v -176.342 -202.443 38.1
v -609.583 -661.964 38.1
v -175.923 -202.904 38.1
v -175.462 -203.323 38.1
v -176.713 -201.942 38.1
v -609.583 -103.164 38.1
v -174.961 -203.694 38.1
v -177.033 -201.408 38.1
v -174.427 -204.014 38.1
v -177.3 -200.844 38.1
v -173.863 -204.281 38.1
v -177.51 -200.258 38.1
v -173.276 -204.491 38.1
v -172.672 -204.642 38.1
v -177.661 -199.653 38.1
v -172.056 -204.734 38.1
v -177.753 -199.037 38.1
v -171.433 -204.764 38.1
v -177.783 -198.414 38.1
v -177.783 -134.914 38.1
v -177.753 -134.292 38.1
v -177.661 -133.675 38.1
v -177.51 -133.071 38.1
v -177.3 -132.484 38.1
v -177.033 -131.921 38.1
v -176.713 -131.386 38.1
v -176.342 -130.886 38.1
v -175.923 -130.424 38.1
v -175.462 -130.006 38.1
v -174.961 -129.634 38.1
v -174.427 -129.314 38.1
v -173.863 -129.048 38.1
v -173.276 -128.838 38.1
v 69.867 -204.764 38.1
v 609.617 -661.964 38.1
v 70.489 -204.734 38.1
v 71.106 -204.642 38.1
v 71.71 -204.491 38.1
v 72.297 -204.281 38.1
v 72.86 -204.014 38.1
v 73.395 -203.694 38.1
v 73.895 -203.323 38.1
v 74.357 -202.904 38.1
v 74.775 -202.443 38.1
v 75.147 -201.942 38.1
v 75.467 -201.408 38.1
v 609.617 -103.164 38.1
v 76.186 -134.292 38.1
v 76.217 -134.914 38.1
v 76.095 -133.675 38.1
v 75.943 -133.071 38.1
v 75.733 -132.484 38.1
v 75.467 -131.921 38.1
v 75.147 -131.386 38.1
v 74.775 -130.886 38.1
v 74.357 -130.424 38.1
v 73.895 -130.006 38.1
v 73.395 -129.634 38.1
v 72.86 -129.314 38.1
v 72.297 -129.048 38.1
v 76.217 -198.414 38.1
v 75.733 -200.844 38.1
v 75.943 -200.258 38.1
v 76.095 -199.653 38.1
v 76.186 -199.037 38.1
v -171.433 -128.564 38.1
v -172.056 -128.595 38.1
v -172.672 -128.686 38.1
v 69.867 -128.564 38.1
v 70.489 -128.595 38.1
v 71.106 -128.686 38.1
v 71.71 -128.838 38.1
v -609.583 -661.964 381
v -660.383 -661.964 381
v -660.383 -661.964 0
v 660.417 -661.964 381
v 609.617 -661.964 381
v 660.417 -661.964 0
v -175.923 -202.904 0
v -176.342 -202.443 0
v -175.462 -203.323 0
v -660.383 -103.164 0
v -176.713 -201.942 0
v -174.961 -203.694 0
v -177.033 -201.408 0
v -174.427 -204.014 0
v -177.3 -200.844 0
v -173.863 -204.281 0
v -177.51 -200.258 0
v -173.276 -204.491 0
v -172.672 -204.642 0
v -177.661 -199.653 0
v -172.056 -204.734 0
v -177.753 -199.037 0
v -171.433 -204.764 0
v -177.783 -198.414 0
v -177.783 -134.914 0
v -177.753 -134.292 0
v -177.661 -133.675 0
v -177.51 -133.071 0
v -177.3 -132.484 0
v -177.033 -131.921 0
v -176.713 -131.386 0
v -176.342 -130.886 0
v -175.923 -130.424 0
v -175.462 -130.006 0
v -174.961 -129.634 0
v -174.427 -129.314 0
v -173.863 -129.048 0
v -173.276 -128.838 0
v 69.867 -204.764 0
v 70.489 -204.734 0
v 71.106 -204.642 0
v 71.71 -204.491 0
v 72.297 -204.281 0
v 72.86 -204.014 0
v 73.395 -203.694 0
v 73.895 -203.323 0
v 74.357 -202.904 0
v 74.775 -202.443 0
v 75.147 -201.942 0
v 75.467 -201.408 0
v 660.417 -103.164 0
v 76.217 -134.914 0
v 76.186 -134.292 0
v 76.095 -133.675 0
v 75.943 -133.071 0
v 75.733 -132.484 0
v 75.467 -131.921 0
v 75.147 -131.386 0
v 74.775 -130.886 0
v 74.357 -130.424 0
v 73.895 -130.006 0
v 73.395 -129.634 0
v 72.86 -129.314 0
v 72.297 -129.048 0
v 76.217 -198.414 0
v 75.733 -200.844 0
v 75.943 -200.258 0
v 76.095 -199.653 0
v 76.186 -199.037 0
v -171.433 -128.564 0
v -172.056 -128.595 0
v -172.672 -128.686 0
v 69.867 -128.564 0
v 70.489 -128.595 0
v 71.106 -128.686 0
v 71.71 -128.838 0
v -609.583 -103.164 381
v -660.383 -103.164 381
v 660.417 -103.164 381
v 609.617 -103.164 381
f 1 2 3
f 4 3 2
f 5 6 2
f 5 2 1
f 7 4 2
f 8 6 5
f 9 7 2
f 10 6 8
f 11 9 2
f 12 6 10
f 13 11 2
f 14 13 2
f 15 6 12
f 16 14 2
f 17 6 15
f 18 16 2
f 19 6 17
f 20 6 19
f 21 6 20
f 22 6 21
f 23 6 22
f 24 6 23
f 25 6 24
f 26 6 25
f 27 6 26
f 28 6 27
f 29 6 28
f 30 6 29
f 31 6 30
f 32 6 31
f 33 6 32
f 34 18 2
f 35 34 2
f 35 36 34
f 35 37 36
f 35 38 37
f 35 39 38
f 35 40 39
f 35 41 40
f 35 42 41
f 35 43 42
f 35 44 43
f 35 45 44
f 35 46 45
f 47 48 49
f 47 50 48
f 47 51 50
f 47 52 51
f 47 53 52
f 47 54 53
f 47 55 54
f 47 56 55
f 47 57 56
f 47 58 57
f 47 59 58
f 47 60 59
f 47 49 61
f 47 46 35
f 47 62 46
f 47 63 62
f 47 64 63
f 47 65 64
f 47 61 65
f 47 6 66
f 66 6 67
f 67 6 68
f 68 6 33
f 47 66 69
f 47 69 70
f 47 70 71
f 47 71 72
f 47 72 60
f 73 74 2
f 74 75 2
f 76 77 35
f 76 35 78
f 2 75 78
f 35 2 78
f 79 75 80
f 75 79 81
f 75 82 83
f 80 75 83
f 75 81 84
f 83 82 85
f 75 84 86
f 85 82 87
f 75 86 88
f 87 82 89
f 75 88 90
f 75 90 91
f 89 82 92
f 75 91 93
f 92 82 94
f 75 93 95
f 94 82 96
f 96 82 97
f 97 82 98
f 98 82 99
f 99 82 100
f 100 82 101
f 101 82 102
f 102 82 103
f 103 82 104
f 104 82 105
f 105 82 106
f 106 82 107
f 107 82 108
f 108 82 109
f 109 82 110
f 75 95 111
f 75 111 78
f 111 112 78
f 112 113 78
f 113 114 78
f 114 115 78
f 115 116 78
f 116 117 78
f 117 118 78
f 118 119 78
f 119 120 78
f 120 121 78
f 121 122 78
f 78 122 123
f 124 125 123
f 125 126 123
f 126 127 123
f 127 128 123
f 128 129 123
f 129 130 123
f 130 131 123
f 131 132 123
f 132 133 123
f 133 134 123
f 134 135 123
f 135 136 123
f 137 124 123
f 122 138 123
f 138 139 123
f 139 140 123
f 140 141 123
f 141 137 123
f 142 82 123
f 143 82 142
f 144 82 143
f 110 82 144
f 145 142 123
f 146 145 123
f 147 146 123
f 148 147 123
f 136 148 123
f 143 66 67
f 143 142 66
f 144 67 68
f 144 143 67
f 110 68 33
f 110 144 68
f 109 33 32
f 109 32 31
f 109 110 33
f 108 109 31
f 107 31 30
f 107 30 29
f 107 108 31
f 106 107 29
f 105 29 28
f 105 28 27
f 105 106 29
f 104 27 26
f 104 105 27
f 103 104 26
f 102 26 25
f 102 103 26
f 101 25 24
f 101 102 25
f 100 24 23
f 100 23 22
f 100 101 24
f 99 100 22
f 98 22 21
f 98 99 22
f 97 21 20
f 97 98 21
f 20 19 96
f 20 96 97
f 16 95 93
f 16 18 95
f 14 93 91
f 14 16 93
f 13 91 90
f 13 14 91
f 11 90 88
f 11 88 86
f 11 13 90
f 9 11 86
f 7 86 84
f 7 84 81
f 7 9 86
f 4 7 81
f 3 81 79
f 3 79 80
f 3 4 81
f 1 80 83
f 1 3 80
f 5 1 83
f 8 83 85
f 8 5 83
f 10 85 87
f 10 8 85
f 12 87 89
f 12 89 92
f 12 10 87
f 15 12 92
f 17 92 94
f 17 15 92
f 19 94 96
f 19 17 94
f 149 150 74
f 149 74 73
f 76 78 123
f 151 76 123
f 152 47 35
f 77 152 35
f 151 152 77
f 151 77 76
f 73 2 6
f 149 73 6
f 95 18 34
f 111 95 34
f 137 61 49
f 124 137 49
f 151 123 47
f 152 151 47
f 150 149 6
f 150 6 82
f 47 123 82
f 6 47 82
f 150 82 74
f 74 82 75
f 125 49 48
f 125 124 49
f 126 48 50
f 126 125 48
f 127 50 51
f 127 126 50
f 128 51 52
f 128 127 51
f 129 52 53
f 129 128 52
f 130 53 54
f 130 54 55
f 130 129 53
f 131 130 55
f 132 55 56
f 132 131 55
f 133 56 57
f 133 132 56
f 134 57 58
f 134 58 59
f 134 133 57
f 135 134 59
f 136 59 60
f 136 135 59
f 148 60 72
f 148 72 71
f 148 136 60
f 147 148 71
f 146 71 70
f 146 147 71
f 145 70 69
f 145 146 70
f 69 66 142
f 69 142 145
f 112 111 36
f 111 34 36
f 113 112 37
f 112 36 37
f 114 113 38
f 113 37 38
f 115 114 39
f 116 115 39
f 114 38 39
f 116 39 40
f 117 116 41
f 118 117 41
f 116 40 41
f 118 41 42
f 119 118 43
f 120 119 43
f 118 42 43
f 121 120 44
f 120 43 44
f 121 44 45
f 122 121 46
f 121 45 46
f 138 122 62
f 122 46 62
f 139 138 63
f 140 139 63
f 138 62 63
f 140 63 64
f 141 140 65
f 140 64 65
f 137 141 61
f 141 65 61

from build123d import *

# Parameters (mm, degrees)
F0_W     = 1320.8
F0_H     = 558.8
F1_DEPTH = 38.1
F2_W     = 254
F2_H     = 76.2
F3_DEPTH = 333.248
F4_R     = 6.35
F5_DEPTH = 342.9


with BuildPart() as f1:
    # F0 (on Top) → F1 (new body)
    with BuildSketch(Plane.XY):
        with Locations((0.0168122351, -382.5642513233)):
            Rectangle(F0_W, F0_H)
    extrude(amount=F1_DEPTH)

    # F2 (on face) → F3 (cut, symmetric)
    with BuildSketch(Plane.XY.offset(38.1)):
        with Locations((-50.7831877649, -166.6642513233)):
            Rectangle(F2_W, F2_H)
    extrude(amount=F3_DEPTH, both=True, mode=Mode.SUBTRACT)

    # F4
    f4_edges = [f1.edges().sort_by_distance(p)[0] for p in [
        (-177.783188, -128.564251, 19.05),
        (-177.783188, -204.764251, 19.05),
        (76.216812, -128.564251, 19.05),
        (76.216812, -204.764251, 19.05),
    ]]
    fillet(f4_edges, radius=F4_R)

    # F2 (on face) → F5 (join)
    with BuildSketch(Plane.XY.offset(38.1)):
        Polygon((-609.5831877649, -103.1642513233), (-660.3831877649, -103.1642513233), (-660.3831877649, -661.9642513233), (-609.5831877649, -661.9642513233), (-609.5831877649, -319.0642513233), (-609.5831877649, -300.0142513233), align=None)
        Polygon((660.4168122351, -103.1642513233), (609.6168122351, -103.1642513233), (609.6168122351, -300.0142513233), (609.6168122351, -319.0642513233), (609.6168122351, -661.9642513233), (660.4168122351, -661.9642513233), align=None)
    extrude(amount=F5_DEPTH)


solid = f1.part
